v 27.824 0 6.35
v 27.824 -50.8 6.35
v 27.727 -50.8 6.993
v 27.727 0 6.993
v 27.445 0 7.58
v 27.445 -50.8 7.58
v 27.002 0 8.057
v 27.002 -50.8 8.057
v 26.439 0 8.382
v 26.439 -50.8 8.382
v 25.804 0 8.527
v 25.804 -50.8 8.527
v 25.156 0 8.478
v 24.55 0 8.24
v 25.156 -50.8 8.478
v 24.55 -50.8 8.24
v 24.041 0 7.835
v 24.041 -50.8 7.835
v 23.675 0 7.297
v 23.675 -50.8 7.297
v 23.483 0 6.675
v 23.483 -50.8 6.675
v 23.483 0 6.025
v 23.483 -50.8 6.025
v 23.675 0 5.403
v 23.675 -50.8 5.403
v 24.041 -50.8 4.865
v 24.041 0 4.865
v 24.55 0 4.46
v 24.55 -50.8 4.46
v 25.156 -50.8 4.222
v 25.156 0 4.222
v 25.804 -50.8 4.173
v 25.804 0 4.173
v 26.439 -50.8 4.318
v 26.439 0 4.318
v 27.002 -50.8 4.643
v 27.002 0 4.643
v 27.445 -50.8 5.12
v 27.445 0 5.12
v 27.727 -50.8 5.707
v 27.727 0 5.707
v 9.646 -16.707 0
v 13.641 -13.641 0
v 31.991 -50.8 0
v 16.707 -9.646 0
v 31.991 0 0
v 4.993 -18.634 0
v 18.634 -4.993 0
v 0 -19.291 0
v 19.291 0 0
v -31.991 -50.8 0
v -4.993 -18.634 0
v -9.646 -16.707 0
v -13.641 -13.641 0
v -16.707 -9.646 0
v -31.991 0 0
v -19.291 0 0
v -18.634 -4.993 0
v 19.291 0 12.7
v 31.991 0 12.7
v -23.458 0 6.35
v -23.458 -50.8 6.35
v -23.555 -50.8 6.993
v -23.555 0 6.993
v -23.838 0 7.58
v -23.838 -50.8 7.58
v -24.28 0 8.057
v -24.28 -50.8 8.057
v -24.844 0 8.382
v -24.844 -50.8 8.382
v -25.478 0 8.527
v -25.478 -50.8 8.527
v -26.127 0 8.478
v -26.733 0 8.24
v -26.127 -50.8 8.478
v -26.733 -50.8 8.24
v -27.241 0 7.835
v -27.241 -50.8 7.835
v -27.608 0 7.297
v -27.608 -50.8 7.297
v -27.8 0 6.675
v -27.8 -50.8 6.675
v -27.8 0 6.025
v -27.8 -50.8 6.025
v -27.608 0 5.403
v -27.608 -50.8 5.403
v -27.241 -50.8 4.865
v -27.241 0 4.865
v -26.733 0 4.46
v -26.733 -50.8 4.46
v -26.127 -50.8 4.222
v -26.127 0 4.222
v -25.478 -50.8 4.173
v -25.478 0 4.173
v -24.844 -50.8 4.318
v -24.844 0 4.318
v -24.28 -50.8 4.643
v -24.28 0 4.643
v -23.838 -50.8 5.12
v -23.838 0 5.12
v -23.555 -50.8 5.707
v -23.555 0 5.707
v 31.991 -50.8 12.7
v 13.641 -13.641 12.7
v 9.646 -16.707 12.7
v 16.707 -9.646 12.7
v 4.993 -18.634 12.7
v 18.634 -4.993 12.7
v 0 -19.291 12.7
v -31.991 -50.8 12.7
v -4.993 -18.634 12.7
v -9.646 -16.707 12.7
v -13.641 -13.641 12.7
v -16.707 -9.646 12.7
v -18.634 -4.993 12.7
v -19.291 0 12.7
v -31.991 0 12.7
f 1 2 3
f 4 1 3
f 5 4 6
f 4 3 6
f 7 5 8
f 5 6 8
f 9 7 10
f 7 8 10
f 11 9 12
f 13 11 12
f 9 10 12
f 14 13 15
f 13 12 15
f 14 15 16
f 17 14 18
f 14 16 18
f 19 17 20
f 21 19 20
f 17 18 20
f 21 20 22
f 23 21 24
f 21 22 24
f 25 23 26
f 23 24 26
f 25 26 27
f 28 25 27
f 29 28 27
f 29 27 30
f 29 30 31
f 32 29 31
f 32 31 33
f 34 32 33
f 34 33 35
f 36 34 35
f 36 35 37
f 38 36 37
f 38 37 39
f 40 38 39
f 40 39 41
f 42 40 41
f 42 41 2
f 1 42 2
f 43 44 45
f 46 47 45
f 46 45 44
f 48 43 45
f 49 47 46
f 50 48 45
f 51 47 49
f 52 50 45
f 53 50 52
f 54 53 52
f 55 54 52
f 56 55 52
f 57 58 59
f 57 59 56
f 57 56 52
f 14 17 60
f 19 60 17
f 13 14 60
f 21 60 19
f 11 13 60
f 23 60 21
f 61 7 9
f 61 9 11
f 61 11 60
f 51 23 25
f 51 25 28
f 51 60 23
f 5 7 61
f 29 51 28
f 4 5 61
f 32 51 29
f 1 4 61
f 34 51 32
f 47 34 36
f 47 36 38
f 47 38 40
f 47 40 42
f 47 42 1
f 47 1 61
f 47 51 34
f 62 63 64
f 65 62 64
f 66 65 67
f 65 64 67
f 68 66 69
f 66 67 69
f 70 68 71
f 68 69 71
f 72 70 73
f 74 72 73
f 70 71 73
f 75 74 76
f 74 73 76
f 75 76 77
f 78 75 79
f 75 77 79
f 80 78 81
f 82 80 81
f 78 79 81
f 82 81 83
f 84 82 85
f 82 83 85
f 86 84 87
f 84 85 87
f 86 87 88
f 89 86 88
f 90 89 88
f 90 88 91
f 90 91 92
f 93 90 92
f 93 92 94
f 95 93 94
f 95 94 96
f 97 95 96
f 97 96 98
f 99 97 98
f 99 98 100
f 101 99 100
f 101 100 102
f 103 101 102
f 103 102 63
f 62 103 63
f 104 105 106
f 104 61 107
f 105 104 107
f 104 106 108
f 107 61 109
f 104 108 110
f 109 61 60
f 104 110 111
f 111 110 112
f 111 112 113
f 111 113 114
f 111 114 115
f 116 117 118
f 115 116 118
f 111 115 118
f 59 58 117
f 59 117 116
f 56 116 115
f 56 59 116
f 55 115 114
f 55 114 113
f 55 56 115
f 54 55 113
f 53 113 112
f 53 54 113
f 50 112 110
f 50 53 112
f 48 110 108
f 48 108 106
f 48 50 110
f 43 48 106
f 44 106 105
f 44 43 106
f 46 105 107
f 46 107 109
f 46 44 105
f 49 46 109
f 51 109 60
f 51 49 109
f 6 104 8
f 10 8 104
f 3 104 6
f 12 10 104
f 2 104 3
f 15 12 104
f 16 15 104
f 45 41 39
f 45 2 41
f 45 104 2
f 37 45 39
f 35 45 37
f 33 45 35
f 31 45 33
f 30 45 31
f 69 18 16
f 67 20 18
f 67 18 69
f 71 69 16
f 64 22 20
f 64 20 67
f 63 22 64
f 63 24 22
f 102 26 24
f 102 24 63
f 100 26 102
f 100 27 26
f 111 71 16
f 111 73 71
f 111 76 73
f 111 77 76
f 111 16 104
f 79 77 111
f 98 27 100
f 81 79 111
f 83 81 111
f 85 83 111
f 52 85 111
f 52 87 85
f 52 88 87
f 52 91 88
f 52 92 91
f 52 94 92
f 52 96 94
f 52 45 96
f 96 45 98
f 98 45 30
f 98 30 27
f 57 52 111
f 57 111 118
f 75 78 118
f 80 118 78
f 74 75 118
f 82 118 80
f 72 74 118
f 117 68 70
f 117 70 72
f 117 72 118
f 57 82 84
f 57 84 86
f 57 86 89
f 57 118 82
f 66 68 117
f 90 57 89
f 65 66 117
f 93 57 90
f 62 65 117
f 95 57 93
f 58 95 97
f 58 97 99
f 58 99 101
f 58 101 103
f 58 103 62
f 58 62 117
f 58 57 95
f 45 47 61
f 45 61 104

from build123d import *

# Parameters (mm, degrees)
BOSS_EXTRUDE1_DEPTH = 12.7
SKETCH2_R           = 2.1828125
CUT_EXTRUDE1_DEPTH  = 62.362637457


with BuildPart() as part:
    # Sketch1 → Boss-Extrude1 (new body)
    with BuildSketch(Plane.XY):
        with BuildLine():
            Line((-31.9913, 0), (-19.2913, 0))
            ThreePointArc((-19.2913, 0), (0, -19.2913), (19.2913, 0))
            Line((19.2913, 0), (31.9913, 0))
            Line((31.9913, 0), (31.9913, -50.8))
            Line((31.9913, -50.8), (-31.9913, -50.8))
            Line((-31.9913, -50.8), (-31.9913, 0))
        make_face()
    extrude(amount=BOSS_EXTRUDE1_DEPTH)

    # Sketch2 → Cut-Extrude1 (cut, through all)
    with BuildSketch(Plane.XZ.offset(50.8)):
        with Locations((-25.6413, 6.35)):
            Circle(SKETCH2_R)
        with Locations((25.6413, 6.35)):
            Circle(SKETCH2_R)
    extrude(amount=-CUT_EXTRUDE1_DEPTH, mode=Mode.SUBTRACT)


solid = part.part
